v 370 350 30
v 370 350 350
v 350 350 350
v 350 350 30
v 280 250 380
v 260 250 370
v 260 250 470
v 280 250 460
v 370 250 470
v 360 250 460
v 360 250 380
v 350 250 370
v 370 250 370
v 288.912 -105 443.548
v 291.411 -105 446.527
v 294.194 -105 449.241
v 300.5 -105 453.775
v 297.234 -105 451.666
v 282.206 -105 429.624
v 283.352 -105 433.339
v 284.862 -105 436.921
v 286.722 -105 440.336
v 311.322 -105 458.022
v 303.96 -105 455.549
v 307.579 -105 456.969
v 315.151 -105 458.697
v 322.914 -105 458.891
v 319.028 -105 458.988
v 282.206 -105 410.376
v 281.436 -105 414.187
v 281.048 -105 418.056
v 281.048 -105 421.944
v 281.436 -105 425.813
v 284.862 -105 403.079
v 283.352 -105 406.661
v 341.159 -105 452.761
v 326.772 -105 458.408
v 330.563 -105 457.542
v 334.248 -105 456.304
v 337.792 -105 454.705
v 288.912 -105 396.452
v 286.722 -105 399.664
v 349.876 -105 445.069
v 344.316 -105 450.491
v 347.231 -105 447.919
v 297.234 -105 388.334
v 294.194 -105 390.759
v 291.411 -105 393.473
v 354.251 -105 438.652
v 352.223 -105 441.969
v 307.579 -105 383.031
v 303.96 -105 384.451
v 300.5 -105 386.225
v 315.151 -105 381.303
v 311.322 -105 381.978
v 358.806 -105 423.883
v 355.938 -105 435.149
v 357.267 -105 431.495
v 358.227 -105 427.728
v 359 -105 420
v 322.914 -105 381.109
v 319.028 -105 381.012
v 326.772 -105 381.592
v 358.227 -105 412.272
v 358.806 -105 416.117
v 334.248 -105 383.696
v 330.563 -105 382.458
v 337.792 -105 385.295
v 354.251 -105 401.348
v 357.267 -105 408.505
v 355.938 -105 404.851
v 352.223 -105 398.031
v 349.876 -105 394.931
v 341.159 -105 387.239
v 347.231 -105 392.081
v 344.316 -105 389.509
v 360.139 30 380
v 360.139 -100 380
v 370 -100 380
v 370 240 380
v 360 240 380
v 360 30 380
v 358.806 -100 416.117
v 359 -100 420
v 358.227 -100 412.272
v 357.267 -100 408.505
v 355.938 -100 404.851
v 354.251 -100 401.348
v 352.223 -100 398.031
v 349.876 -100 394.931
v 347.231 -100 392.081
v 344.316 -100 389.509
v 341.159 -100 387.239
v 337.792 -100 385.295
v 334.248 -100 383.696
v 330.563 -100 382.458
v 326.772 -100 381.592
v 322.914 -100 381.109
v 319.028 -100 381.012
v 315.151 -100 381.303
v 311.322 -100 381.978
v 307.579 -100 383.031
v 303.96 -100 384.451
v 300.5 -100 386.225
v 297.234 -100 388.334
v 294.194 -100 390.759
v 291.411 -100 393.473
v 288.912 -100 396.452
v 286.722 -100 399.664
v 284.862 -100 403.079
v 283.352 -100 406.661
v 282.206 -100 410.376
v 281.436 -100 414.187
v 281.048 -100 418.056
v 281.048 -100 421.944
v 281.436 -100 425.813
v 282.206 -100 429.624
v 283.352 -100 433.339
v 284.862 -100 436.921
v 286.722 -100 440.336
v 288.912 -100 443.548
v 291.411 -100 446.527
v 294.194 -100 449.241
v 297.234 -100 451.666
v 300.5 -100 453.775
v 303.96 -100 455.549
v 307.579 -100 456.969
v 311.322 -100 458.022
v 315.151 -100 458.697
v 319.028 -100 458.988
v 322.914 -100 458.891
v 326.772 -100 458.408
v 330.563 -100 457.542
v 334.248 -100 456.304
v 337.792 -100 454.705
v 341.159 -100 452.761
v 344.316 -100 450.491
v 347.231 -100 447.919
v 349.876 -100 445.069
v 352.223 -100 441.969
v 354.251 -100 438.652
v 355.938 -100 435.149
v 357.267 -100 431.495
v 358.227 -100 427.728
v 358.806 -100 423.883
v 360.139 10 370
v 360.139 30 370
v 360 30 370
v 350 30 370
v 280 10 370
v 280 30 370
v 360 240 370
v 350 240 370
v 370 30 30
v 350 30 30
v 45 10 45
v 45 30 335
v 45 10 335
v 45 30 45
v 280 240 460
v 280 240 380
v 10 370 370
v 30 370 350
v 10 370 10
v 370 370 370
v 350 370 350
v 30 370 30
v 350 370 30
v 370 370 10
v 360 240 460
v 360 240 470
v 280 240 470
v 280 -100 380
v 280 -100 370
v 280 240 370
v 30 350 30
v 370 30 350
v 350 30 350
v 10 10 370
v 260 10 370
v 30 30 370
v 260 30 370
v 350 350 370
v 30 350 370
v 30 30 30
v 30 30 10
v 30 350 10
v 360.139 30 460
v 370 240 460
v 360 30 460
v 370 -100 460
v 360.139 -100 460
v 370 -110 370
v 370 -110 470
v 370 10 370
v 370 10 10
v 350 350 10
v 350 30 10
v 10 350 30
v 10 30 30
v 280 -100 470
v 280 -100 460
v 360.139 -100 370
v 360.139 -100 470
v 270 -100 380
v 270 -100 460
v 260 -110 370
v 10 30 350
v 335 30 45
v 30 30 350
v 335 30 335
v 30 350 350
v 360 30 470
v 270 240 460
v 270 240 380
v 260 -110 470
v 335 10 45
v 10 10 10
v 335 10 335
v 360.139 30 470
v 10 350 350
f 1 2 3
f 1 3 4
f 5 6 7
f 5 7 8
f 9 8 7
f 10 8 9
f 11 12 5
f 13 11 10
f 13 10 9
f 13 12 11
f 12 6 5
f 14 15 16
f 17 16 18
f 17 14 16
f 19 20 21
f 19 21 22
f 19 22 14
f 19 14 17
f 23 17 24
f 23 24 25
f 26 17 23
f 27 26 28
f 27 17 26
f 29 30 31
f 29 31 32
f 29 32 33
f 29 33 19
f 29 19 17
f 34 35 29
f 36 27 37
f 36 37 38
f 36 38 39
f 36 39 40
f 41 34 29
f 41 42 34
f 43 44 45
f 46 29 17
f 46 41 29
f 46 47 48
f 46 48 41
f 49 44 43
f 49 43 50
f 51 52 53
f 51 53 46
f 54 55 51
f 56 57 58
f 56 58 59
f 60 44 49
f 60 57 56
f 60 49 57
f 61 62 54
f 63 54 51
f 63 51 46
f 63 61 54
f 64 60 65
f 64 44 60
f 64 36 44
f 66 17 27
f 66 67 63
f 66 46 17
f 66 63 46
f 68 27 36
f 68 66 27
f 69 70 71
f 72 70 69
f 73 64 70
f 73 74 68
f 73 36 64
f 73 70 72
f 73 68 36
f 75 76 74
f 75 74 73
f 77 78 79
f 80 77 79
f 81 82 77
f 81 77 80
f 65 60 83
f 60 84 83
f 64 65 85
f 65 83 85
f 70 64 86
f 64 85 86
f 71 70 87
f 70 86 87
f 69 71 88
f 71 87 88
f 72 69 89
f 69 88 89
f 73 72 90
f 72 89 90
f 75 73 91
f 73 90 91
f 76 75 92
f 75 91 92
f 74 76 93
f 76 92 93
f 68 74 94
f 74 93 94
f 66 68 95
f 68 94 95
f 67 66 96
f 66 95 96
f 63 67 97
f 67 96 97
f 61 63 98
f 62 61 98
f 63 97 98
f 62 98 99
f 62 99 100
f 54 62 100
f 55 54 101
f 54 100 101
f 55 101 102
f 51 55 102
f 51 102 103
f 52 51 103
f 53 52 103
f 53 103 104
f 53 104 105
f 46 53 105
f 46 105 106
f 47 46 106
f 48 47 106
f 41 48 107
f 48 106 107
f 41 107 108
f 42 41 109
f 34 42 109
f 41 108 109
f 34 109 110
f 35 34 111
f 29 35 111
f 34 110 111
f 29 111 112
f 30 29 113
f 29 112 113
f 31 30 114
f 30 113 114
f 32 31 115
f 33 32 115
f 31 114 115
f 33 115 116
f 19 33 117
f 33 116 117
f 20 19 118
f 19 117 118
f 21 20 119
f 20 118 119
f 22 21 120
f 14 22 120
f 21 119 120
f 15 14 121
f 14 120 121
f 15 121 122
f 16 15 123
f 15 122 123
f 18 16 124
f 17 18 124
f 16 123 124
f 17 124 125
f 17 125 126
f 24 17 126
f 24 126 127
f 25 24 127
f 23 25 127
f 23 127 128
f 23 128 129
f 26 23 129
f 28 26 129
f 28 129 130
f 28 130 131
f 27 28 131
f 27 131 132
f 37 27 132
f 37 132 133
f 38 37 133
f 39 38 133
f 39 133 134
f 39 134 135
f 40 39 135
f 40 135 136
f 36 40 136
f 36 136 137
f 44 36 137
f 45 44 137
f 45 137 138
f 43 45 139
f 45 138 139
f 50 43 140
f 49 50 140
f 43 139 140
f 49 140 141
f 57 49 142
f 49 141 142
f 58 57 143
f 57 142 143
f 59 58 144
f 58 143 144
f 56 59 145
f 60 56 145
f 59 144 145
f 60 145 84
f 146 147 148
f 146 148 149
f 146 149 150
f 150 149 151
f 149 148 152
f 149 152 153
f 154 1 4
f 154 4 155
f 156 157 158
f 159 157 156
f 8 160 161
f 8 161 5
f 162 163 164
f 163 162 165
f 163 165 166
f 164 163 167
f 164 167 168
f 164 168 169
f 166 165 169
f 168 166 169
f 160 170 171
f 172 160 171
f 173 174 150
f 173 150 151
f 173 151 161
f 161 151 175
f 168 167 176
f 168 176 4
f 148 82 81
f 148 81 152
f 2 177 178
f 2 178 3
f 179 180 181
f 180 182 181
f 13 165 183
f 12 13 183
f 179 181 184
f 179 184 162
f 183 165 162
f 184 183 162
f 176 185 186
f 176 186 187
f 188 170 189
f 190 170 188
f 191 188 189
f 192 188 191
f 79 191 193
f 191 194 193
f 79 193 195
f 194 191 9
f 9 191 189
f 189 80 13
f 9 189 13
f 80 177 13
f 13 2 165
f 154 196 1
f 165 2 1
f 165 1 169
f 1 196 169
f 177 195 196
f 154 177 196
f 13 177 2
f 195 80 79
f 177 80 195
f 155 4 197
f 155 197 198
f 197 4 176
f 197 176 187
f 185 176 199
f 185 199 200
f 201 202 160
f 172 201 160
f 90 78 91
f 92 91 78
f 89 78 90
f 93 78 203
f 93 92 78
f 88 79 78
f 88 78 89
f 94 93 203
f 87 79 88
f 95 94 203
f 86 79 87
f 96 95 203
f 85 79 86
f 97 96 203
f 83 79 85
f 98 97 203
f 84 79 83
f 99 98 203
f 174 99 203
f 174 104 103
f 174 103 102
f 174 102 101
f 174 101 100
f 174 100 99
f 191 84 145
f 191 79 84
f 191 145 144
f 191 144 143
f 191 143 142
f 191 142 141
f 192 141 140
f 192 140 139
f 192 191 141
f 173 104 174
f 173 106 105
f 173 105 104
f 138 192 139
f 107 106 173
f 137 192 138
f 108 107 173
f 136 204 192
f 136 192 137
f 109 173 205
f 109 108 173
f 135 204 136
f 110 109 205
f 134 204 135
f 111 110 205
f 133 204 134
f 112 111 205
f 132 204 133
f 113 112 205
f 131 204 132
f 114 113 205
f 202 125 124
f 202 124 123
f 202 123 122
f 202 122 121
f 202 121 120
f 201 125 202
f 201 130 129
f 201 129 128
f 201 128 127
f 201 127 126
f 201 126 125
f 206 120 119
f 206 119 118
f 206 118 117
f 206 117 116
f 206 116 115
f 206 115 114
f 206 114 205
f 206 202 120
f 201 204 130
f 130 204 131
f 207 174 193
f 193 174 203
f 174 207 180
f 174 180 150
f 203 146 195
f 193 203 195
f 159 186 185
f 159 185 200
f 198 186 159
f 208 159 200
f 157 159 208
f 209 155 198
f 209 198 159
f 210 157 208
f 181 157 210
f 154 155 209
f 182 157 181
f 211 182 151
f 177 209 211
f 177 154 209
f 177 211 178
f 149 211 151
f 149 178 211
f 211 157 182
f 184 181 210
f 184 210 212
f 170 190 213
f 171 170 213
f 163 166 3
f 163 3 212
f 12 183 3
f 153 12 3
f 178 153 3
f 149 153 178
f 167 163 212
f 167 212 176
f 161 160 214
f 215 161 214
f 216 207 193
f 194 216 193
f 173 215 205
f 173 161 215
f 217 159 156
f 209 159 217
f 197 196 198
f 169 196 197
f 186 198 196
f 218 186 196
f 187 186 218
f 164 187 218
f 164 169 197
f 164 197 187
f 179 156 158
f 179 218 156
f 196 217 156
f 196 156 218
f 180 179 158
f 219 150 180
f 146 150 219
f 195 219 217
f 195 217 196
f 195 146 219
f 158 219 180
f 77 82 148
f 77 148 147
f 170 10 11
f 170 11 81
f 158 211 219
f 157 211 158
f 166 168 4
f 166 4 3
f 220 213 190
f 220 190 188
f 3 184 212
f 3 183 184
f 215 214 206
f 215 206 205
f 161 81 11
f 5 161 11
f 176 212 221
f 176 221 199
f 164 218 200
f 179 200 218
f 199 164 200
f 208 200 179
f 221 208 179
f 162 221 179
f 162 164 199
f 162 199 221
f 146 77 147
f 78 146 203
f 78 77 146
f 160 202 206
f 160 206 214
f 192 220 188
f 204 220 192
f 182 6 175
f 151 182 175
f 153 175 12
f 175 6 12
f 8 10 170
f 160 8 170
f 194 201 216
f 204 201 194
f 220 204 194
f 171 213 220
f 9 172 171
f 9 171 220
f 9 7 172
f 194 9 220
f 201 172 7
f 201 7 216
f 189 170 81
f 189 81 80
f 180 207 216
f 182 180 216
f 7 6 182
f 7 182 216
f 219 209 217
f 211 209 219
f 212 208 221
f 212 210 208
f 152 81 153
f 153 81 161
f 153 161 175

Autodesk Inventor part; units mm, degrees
ref_plane "YZ Plane" through (0, 0, 0) normal (1, 0, 0) x (0, 1, 0)
ref_plane "XZ Plane" through (0, 0, 0) normal (0, 1, 0) x (-1, 0, 0)
ref_plane "XY Plane" through (0, 0, 0) normal (0, 0, 1) x (1, 0, 0)
sketch "Sketch1" plane through (0, 0, 0) normal (0, 0, 1) x (1, 0, 0)
  line L0 (0, 0) -> (380, 0)
  line L1 (380, 0) -> (380, 380)
  line L2 (380, 380) -> (0, 380)
  line L3 (0, 380) -> (0, 0)
  dimension "d0" = 380
  dimension "d1" = 380
extrude "Extrusion1" add sketch "Sketch1" along normal blind 380
sketch "Sketch2" plane through (0, 0, 380) normal (0, 0, 1) x (1, 0, 0)
  line L0 (30, 350) -> (350, 350)
  line L1 (350, 350) -> (350, 30)
  line L2 (350, 30) -> (30, 30)
  line L3 (30, 30) -> (30, 350)
  line L4 (380, 380) -> (0, 380) projected
  line L5 (0, 380) -> (0, 0) projected
  line L6 (0, 0) -> (380, 0) projected
  line L7 (380, 0) -> (380, 380) projected
  dimension "d4" = 30
  dimension "d5" = 30
  dimension "d6" = 30
  dimension "d7" = 30
extrude "Extrusion2" cut sketch "Sketch2" against normal blind 600 contours L0 L1 L2 L3
sketch "Sketch3" plane through (380, 0, 0) normal (1, 0, 0) x (0, 0, -1)
  line L0 (-350, 350) -> (-30, 350)
  line L1 (-30, 350) -> (-30, 30)
  line L2 (-30, 30) -> (-350, 30)
  line L3 (-350, 30) -> (-350, 350)
  line L4 (0, 380) -> (-380, 380) projected
  line L5 (-380, 0) -> (-380, 380) projected
  line L6 (0, 0) -> (0, 380) projected
  line L7 (0, 0) -> (-380, 0) projected
  dimension "d10" = 30
  dimension "d11" = 30
  dimension "d12" = 30
  dimension "d13" = 30
extrude "Extrusion3" cut sketch "Sketch3" against normal blind 600 contours L0 L1 L2 L3
sketch "Sketch4" plane through (0, 380, 0) normal (0, 1, 0) x (1, 0, 0)
  line L0 (30, -30) -> (30, 0) projected
  line L1 (350, -380) -> (350, -350) projected
  line L2 (30, -30) -> (350, -30)
  line L3 (350, -30) -> (350, -350)
  line L4 (350, -350) -> (30, -350)
  line L5 (30, -350) -> (30, -30)
  point P0 (0, 0)
extrude "Extrusion4" cut sketch "Sketch4" against normal blind 600
sketch "Sketch5" plane through (30, 0, 30) normal (1, 0, 0) x (0, 0, -1)
  line L0 (-350, 30) -> (-320, 30) projected
  line L1 (0, 30) -> (0, 0) projected
  line L2 (-320, 30) -> (0, 30)
  line L3 (0, 30) -> (0, 0)
  line L4 (0, 0) -> (-320, 0)
  line L5 (-320, 0) -> (-320, 30)
  point P0 (30, 0)
extrude "Extrusion5" add sketch "Sketch5" along normal blind 15
sketch "Sketch6" plane through (350, 0, 30) normal (0, 0, 1) x (1, 0, 0)
  line L0 (-320, 30) -> (-350, 30) projected
  line L1 (0, 30) -> (0, 0) projected
  line L2 (-320, 30) -> (0, 30)
  line L3 (0, 30) -> (0, 0)
  line L4 (0, 0) -> (-320, 0)
  line L5 (-320, 0) -> (-320, 30)
  point P0 (-350, 0)
extrude "Extrusion6" add sketch "Sketch6" along normal blind 15
sketch "Sketch7" plane through (350, 0, 350) normal (-1, 0, 0) x (0, 0, 1)
  line L0 (0, 30) -> (-320, 30) projected
  line L1 (0, 0) -> (-305, 0) projected
  line L2 (-320, 30) -> (0, 30)
  line L3 (0, 30) -> (0, 0)
  line L4 (0, 0) -> (-320, 0)
  line L5 (-320, 0) -> (-320, 30)
  point P0 (-350, 0)
extrude "Extrusion7" add sketch "Sketch7" along normal blind 15
sketch "Sketch8" plane through (45, 0, 350) normal (0, 0, -1) x (-1, 0, 0)
  line L0 (45, 0) -> (-335, 0) projected
  line L1 (-305, 30) -> (15, 30)
  line L2 (15, 30) -> (15, 0)
  line L3 (15, 0) -> (-305, 0)
  line L4 (-305, 0) -> (-305, 30)
  dimension "d24" = 320
extrude "Extrusion8" add sketch "Sketch8" along normal blind 15
sketch "Sketch9" plane through (0, 380, 0) normal (0, 1, 0) x (1, 0, 0)
  line L0 (0, -380) -> (380, -380) projected
  line L1 (0, 0) -> (20, 0)
  line L2 (10, -380) -> (0, -380)
  line L3 (0, -380) -> (0, 0)
  line L4 (20, 0) -> (380, 0)
  line L5 (380, 0) -> (380, -10)
  line L6 (380, -10) -> (10, -10)
  line L7 (10, -10) -> (10, -380)
  line L8 (0, -30) -> (0, -350) projected
  dimension "d27" = 10
  dimension "d28" = 10
extrude "Extrusion9" cut sketch "Sketch9" against normal blind 900
sketch "Sketch10" plane through (10, 380, 10) normal (0, 1, 0) x (1, 0, 0)
  line L0 (370, 0) -> (360, 0)
  line L1 (360, 0) -> (360, -370)
  line L2 (360, -370) -> (370, -370)
  line L3 (370, -370) -> (370, 0)
  line L4 (0, -370) -> (360, -370)
  line L5 (360, -370) -> (360, -360)
  line L6 (360, -360) -> (0, -360)
  line L7 (0, -360) -> (0, -370)
  point P0 (-10, 10)
  dimension "d31" = 10
  dimension "d32" = 10
extrude "Extrusion10" cut sketch "Sketch10" against normal blind 900
sketch "Sketch11" plane through (370, 380, 370) normal (1, 0, 0) x (0, 0, -1)
  line L0 (0, 0) -> (360, 0) projected
  line L1 (0, 0) -> (360, 0)
  line L2 (360, 0) -> (360, -10)
  line L3 (360, -10) -> (0, -10)
  line L4 (0, -10) -> (0, 0)
  line L5 (360, 0) -> (360, -380) projected
  line L6 (0, -380) -> (360, -380)
  line L7 (360, -380) -> (360, -370)
  line L8 (360, -370) -> (0, -370)
  line L9 (0, -370) -> (0, -380)
  point P0 (370, -380)
  dimension "d35" = 10
  dimension "d36" = 10
extrude "Extrusion11" cut sketch "Sketch11" against normal blind 900
sketch "Sketch13" plane through (10, 10, 370) normal (0, 0, 1) x (1, 0, 0)
  line L0 (0, 0) -> (360, 0) projected
  line L1 (360, 0) -> (260, 0)
  line L2 (260, 0) -> (260, 500)
  line L3 (260, 500) -> (360, 500)
  line L4 (360, 500) -> (360, 0)
  point P0 (-10, -10)
  point P1 (260, 0)
  dimension "d41" = 100
  dimension "d42" = 500
extrude "Extrusion13" add sketch "Sketch13" along normal blind 100
sketch "Sketch14" plane through (270, 510, 370) normal (0, 1, 0) x (1, 0, 0)
  line L0 (10, -10) -> (90, -10)
  line L1 (90, -10) -> (90, -90)
  line L2 (90, -90) -> (10, -90)
  line L3 (10, -90) -> (10, -10)
  line L4 (100, 0) -> (0, 0) projected
  line L5 (0, 0) -> (0, -100) projected
  line L6 (100, -100) -> (0, -100) projected
  line L7 (100, 0) -> (100, -100) projected
  point P0 (-270, 370)
  dimension "d45" = 10
  dimension "d46" = 10
  dimension "d47" = 10
  dimension "d48" = 10
extrude "Extrusion14" cut sketch "Sketch14" against normal blind 900 contours L0 L1 L2 L3
sketch "Sketch15" plane through (10, 10, 470) normal (0, 0, 1) x (1, 0, 0)
  line L0 (270, 500) -> (270, 0) projected
  line L1 (360, 20) -> (340, 20) projected
  line L2 (270, 490) -> (350, 490)
  line L3 (350, 490) -> (350, 20)
  line L4 (350, 20) -> (270, 20)
  line L5 (270, 20) -> (270, 490)
  line L6 (360, 500) -> (260, 500) projected
  point P0 (-10, -10)
  point P1 (270, 20)
  dimension "d51" = 10
extrude "Extrusion15" cut sketch "Sketch15" against normal blind 100
sketch "Sketch16" plane through (370, 10, 10) normal (1, 0, 0) x (0, 0, -1)
  line L0 (-450, 490) -> (-370, 490)
  line L1 (-370, 490) -> (-370, 20)
  line L2 (-370, 20) -> (-450, 20)
  line L3 (-450, 20) -> (-450, 490)
  line L4 (-360, 500) -> (-460, 500) projected
  line L5 (-460, 0) -> (-460, 500) projected
  line L6 (-360, 360) -> (-360, 500) projected
  line L7 (0, 0) -> (-460, 0) projected
  point P0 (10, -10)
  dimension "d54" = 10
  dimension "d55" = 10
  dimension "d56" = 10
  dimension "d57" = 20
extrude "Extrusion16" cut sketch "Sketch16" against normal blind 100
sketch "Sketch17" plane through (10, 10, 10) normal (0, -1, 0) x (1, 0, 0)
  line L0 (270, 450) -> (350, 450) projected
  line L1 (270, 370) -> (350, 370) projected
  line L2 (270, 450) -> (350, 450)
  line L3 (350, 450) -> (350, 370)
  line L4 (350, 370) -> (270, 370)
  line L5 (270, 370) -> (270, 450)
  point P0 (-10, -10)
  point P1 (350, 450)
extrude "Extrusion17" add sketch "Sketch17" against normal blind 20
sketch "Sketch19" plane through (370, 10, 10) normal (1, 0, 0) x (0, 0, -1)
  line L0 (-360, 500) -> (-460, 500) projected
  line L1 (-360, 490) -> (-360, 360) projected
  line L2 (-460, 500) -> (-360, 500)
  line L3 (-360, 500) -> (-360, 420)
  line L4 (-360, 420) -> (-460, 420)
  line L5 (-460, 420) -> (-460, 500)
  point P0 (10, -10)
  dimension "d65" = 80
extrude "Extrusion19" cut sketch "Sketch19" against normal blind 8900
sketch "Sketch20" plane through (370, 10, 10) normal (1, 0, 0) x (0, 0, -1)
  line L0 (-460, 420) -> (-450, 420) projected
  line L1 (-360, 360) -> (-360, 20) projected
  line L2 (-460, 420) -> (-360, 420)
  line L3 (-360, 420) -> (-360, 360)
  line L4 (-360, 360) -> (-460, 360)
  line L5 (-460, 360) -> (-460, 420)
  point P0 (10, -10)
extrude "Extrusion20" cut sketch "Sketch20" against normal blind 8900
sketch "Sketch21" plane through (270, 370, 380) normal (0, 0, 1) x (1, 0, 0)
  line L0 (10, -20) -> (10, 0) projected
  line L1 (0, 0) -> (10, 0)
  line L2 (10, 0) -> (10, -20)
  line L3 (10, -20) -> (0, -20)
  line L4 (0, -20) -> (0, 0)
  point P0 (-270, -370)
extrude "Extrusion21" add sketch "Sketch21" along normal up to surface (80 mm away)
sketch "Sketch22" plane through (280, 30, 470) normal (1, 0, 0) x (0, 0, -1)
  line L0 (0, 340) -> (10, 340)
  line L1 (10, 340) -> (10, 320)
  line L2 (10, 320) -> (0, 320)
  line L3 (0, 320) -> (0, 340)
  point P0 (470, -30)
  dimension "d72" = 20
extrude "Extrusion22" add sketch "Sketch22" along normal up to surface (80 mm away)
sketch "Sketch23" plane through (370, 10, 10) normal (1, 0, 0) x (0, 0, -1)
  line L0 (-370, 20) -> (-370, 360) projected
  line L1 (-450, 360) -> (-370, 360)
  line L2 (-370, 360) -> (-370, 340)
  line L3 (-370, 340) -> (-450, 340)
  line L4 (-450, 340) -> (-450, 360)
  point P0 (10, -10)
  dimension "d75" = 20
extrude "Extrusion23" add sketch "Sketch23" against normal blind 10
sketch "Sketch26" plane through (10, 10, 10) normal (0, -1, 0) x (1, 0, 0)
  line L0 (260, 460) -> (360, 460) projected
  line L1 (360, 0) -> (360, 460) projected
  line L2 (260, 460) -> (360, 460)
  line L3 (360, 460) -> (360, 360)
  line L4 (360, 360) -> (260, 360)
  line L5 (260, 360) -> (260, 460)
  point P0 (-10, -10)
  dimension "d86" = 100
extrude "Extrusion26" add sketch "Sketch26" along normal blind 120
sketch "Sketch30" plane through (10, 10, 470) normal (0, 0, 1) x (1, 0, 0)
  line L0 (360, 360) -> (260, 360) projected
  line L1 (260, 340) -> (260, 20) projected
  line L2 (360, 360) -> (260, 360)
  line L3 (260, 360) -> (260, 240)
  line L4 (260, 240) -> (360, 240)
  line L5 (360, 240) -> (360, 360)
  point P0 (-10, -10)
  dimension "d96" = 120
extrude "Extrusion30" cut sketch "Sketch30" against normal up to surface (100 mm away)
sketch "Sketch31" plane through (370, 10, 10) normal (1, 0, 0) x (0, 0, -1)
  line L0 (-450, 240) -> (-450, 20) projected
  line L1 (-450, 20) -> (-370, 20)
  line L2 (-370, 20) -> (-370, -110)
  line L3 (-370, -110) -> (-450, -110)
  line L4 (-450, -110) -> (-450, 20)
  line L5 (-360, -120) -> (-460, -120) projected
  point P0 (10, -10)
  dimension "d99" = 10
extrude "Extrusion31" cut sketch "Sketch31" against normal blind 200
sketch "Sketch32" plane through (10, 10, 470) normal (0, 0, 1) x (1, 0, 0)
  line L0 (350, 20) -> (270, 20) projected
  line L1 (270, 20) -> (350.1391, 20)
  line L2 (350.1391, 20) -> (350.1391, -110)
  line L3 (350.1391, -110) -> (270, -110)
  line L4 (270, -110) -> (270, 20)
  line L5 (360, -120) -> (260, -120) projected
  point P0 (-10, -10)
  point P1 (350, 20)
  dimension "d102" = 10
extrude "Extrusion32" cut sketch "Sketch32" against normal blind 100
sketch "Sketch33" plane through (270, 250, 380) normal (0, 0, 1) x (1, 0, 0)
  line L0 (0, 0) -> (10, 0) projected
  line L1 (10, -350) -> (10, 0) projected
  line L2 (0, 0) -> (10, 0)
  line L3 (10, 0) -> (10, -10)
  line L4 (10, -10) -> (0, -10)
  line L5 (0, -10) -> (0, 0)
  point P0 (-270, -250)
  dimension "d105" = 10
extrude "Extrusion33" add sketch "Sketch33" along normal up to surface (80 mm away)
sketch "Sketch34" plane through (280, 10, 370) normal (1, 0, 0) x (0, 0, -1)
  line L0 (-90, 240) -> (-90, 20) projected
  line L1 (-100, 240) -> (-90, 240)
  line L2 (-90, 240) -> (-90, 230)
  line L3 (-90, 230) -> (-100, 230)
  line L4 (-100, 230) -> (-100, 240)
  line L5 (0, 240) -> (-100, 240) projected
  line L6 (-10, 20) -> (-10, 240) projected
  line L7 (0, 240) -> (-10, 240)
  line L8 (-10, 240) -> (-10, 230)
  line L9 (-10, 230) -> (0, 230)
  line L10 (0, 230) -> (0, 240)
  point P0 (370, -10)
  point P1 (-90, 240)
  dimension "d108" = 10
extrude "Extrusion34" add sketch "Sketch34" along normal up to surface (90 mm away)
sketch "Sketch35" plane through (280, 250, 380) normal (0, 0, 1) x (1, 0, 0)
  line L0 (0, 0) -> (90, 0) projected
  line L1 (80, -10) -> (80, -220) projected
  line L2 (90, 0) -> (80, 0)
  line L3 (80, 0) -> (80, -10)
  line L4 (80, -10) -> (90, -10)
  line L5 (90, -10) -> (90, 0)
  point P0 (-280, -250)
extrude "Extrusion35" add sketch "Sketch35" along normal up to surface (80 mm away)
sketch "Sketch36" plane through (370, -100, 460) normal (0, 1, 0) x (1, 0, 0)
  line L0 (-340, 90) -> (-100, 90) projected
  line L1 (0, -10) -> (-100, -10) projected
  line L2 (-100, 90) -> (0, -10)
  circle A0 centre (-50, 40) radius 39
  point P0 (-370, 460)
  dimension "d113" = 78
extrude "Extrusion36" cut sketch "Sketch36" against normal blind 5
sketch "Sketch41" plane through (30, 350, 370) normal (0, 0, 1) x (1, 0, 0)
  point P0 (-30, -350)
sketch "Sketch42" plane through (270, 250, 470) normal (0, 1, 0) x (1, 0, 0)
  line L0 (-240, 100) -> (0, 100) projected
  line L1 (0, 100) -> (-10, 100)
  line L2 (-10, 100) -> (-10, 0)
  line L3 (-10, 0) -> (0, 0)
  line L4 (0, 0) -> (0, 100)
  point P0 (-270, 470)
  dimension "d119" = 10
extrude "Extrusion37" add sketch "Sketch42" against normal up to surface (360 mm away)
properties part number "Motor housing 2"
